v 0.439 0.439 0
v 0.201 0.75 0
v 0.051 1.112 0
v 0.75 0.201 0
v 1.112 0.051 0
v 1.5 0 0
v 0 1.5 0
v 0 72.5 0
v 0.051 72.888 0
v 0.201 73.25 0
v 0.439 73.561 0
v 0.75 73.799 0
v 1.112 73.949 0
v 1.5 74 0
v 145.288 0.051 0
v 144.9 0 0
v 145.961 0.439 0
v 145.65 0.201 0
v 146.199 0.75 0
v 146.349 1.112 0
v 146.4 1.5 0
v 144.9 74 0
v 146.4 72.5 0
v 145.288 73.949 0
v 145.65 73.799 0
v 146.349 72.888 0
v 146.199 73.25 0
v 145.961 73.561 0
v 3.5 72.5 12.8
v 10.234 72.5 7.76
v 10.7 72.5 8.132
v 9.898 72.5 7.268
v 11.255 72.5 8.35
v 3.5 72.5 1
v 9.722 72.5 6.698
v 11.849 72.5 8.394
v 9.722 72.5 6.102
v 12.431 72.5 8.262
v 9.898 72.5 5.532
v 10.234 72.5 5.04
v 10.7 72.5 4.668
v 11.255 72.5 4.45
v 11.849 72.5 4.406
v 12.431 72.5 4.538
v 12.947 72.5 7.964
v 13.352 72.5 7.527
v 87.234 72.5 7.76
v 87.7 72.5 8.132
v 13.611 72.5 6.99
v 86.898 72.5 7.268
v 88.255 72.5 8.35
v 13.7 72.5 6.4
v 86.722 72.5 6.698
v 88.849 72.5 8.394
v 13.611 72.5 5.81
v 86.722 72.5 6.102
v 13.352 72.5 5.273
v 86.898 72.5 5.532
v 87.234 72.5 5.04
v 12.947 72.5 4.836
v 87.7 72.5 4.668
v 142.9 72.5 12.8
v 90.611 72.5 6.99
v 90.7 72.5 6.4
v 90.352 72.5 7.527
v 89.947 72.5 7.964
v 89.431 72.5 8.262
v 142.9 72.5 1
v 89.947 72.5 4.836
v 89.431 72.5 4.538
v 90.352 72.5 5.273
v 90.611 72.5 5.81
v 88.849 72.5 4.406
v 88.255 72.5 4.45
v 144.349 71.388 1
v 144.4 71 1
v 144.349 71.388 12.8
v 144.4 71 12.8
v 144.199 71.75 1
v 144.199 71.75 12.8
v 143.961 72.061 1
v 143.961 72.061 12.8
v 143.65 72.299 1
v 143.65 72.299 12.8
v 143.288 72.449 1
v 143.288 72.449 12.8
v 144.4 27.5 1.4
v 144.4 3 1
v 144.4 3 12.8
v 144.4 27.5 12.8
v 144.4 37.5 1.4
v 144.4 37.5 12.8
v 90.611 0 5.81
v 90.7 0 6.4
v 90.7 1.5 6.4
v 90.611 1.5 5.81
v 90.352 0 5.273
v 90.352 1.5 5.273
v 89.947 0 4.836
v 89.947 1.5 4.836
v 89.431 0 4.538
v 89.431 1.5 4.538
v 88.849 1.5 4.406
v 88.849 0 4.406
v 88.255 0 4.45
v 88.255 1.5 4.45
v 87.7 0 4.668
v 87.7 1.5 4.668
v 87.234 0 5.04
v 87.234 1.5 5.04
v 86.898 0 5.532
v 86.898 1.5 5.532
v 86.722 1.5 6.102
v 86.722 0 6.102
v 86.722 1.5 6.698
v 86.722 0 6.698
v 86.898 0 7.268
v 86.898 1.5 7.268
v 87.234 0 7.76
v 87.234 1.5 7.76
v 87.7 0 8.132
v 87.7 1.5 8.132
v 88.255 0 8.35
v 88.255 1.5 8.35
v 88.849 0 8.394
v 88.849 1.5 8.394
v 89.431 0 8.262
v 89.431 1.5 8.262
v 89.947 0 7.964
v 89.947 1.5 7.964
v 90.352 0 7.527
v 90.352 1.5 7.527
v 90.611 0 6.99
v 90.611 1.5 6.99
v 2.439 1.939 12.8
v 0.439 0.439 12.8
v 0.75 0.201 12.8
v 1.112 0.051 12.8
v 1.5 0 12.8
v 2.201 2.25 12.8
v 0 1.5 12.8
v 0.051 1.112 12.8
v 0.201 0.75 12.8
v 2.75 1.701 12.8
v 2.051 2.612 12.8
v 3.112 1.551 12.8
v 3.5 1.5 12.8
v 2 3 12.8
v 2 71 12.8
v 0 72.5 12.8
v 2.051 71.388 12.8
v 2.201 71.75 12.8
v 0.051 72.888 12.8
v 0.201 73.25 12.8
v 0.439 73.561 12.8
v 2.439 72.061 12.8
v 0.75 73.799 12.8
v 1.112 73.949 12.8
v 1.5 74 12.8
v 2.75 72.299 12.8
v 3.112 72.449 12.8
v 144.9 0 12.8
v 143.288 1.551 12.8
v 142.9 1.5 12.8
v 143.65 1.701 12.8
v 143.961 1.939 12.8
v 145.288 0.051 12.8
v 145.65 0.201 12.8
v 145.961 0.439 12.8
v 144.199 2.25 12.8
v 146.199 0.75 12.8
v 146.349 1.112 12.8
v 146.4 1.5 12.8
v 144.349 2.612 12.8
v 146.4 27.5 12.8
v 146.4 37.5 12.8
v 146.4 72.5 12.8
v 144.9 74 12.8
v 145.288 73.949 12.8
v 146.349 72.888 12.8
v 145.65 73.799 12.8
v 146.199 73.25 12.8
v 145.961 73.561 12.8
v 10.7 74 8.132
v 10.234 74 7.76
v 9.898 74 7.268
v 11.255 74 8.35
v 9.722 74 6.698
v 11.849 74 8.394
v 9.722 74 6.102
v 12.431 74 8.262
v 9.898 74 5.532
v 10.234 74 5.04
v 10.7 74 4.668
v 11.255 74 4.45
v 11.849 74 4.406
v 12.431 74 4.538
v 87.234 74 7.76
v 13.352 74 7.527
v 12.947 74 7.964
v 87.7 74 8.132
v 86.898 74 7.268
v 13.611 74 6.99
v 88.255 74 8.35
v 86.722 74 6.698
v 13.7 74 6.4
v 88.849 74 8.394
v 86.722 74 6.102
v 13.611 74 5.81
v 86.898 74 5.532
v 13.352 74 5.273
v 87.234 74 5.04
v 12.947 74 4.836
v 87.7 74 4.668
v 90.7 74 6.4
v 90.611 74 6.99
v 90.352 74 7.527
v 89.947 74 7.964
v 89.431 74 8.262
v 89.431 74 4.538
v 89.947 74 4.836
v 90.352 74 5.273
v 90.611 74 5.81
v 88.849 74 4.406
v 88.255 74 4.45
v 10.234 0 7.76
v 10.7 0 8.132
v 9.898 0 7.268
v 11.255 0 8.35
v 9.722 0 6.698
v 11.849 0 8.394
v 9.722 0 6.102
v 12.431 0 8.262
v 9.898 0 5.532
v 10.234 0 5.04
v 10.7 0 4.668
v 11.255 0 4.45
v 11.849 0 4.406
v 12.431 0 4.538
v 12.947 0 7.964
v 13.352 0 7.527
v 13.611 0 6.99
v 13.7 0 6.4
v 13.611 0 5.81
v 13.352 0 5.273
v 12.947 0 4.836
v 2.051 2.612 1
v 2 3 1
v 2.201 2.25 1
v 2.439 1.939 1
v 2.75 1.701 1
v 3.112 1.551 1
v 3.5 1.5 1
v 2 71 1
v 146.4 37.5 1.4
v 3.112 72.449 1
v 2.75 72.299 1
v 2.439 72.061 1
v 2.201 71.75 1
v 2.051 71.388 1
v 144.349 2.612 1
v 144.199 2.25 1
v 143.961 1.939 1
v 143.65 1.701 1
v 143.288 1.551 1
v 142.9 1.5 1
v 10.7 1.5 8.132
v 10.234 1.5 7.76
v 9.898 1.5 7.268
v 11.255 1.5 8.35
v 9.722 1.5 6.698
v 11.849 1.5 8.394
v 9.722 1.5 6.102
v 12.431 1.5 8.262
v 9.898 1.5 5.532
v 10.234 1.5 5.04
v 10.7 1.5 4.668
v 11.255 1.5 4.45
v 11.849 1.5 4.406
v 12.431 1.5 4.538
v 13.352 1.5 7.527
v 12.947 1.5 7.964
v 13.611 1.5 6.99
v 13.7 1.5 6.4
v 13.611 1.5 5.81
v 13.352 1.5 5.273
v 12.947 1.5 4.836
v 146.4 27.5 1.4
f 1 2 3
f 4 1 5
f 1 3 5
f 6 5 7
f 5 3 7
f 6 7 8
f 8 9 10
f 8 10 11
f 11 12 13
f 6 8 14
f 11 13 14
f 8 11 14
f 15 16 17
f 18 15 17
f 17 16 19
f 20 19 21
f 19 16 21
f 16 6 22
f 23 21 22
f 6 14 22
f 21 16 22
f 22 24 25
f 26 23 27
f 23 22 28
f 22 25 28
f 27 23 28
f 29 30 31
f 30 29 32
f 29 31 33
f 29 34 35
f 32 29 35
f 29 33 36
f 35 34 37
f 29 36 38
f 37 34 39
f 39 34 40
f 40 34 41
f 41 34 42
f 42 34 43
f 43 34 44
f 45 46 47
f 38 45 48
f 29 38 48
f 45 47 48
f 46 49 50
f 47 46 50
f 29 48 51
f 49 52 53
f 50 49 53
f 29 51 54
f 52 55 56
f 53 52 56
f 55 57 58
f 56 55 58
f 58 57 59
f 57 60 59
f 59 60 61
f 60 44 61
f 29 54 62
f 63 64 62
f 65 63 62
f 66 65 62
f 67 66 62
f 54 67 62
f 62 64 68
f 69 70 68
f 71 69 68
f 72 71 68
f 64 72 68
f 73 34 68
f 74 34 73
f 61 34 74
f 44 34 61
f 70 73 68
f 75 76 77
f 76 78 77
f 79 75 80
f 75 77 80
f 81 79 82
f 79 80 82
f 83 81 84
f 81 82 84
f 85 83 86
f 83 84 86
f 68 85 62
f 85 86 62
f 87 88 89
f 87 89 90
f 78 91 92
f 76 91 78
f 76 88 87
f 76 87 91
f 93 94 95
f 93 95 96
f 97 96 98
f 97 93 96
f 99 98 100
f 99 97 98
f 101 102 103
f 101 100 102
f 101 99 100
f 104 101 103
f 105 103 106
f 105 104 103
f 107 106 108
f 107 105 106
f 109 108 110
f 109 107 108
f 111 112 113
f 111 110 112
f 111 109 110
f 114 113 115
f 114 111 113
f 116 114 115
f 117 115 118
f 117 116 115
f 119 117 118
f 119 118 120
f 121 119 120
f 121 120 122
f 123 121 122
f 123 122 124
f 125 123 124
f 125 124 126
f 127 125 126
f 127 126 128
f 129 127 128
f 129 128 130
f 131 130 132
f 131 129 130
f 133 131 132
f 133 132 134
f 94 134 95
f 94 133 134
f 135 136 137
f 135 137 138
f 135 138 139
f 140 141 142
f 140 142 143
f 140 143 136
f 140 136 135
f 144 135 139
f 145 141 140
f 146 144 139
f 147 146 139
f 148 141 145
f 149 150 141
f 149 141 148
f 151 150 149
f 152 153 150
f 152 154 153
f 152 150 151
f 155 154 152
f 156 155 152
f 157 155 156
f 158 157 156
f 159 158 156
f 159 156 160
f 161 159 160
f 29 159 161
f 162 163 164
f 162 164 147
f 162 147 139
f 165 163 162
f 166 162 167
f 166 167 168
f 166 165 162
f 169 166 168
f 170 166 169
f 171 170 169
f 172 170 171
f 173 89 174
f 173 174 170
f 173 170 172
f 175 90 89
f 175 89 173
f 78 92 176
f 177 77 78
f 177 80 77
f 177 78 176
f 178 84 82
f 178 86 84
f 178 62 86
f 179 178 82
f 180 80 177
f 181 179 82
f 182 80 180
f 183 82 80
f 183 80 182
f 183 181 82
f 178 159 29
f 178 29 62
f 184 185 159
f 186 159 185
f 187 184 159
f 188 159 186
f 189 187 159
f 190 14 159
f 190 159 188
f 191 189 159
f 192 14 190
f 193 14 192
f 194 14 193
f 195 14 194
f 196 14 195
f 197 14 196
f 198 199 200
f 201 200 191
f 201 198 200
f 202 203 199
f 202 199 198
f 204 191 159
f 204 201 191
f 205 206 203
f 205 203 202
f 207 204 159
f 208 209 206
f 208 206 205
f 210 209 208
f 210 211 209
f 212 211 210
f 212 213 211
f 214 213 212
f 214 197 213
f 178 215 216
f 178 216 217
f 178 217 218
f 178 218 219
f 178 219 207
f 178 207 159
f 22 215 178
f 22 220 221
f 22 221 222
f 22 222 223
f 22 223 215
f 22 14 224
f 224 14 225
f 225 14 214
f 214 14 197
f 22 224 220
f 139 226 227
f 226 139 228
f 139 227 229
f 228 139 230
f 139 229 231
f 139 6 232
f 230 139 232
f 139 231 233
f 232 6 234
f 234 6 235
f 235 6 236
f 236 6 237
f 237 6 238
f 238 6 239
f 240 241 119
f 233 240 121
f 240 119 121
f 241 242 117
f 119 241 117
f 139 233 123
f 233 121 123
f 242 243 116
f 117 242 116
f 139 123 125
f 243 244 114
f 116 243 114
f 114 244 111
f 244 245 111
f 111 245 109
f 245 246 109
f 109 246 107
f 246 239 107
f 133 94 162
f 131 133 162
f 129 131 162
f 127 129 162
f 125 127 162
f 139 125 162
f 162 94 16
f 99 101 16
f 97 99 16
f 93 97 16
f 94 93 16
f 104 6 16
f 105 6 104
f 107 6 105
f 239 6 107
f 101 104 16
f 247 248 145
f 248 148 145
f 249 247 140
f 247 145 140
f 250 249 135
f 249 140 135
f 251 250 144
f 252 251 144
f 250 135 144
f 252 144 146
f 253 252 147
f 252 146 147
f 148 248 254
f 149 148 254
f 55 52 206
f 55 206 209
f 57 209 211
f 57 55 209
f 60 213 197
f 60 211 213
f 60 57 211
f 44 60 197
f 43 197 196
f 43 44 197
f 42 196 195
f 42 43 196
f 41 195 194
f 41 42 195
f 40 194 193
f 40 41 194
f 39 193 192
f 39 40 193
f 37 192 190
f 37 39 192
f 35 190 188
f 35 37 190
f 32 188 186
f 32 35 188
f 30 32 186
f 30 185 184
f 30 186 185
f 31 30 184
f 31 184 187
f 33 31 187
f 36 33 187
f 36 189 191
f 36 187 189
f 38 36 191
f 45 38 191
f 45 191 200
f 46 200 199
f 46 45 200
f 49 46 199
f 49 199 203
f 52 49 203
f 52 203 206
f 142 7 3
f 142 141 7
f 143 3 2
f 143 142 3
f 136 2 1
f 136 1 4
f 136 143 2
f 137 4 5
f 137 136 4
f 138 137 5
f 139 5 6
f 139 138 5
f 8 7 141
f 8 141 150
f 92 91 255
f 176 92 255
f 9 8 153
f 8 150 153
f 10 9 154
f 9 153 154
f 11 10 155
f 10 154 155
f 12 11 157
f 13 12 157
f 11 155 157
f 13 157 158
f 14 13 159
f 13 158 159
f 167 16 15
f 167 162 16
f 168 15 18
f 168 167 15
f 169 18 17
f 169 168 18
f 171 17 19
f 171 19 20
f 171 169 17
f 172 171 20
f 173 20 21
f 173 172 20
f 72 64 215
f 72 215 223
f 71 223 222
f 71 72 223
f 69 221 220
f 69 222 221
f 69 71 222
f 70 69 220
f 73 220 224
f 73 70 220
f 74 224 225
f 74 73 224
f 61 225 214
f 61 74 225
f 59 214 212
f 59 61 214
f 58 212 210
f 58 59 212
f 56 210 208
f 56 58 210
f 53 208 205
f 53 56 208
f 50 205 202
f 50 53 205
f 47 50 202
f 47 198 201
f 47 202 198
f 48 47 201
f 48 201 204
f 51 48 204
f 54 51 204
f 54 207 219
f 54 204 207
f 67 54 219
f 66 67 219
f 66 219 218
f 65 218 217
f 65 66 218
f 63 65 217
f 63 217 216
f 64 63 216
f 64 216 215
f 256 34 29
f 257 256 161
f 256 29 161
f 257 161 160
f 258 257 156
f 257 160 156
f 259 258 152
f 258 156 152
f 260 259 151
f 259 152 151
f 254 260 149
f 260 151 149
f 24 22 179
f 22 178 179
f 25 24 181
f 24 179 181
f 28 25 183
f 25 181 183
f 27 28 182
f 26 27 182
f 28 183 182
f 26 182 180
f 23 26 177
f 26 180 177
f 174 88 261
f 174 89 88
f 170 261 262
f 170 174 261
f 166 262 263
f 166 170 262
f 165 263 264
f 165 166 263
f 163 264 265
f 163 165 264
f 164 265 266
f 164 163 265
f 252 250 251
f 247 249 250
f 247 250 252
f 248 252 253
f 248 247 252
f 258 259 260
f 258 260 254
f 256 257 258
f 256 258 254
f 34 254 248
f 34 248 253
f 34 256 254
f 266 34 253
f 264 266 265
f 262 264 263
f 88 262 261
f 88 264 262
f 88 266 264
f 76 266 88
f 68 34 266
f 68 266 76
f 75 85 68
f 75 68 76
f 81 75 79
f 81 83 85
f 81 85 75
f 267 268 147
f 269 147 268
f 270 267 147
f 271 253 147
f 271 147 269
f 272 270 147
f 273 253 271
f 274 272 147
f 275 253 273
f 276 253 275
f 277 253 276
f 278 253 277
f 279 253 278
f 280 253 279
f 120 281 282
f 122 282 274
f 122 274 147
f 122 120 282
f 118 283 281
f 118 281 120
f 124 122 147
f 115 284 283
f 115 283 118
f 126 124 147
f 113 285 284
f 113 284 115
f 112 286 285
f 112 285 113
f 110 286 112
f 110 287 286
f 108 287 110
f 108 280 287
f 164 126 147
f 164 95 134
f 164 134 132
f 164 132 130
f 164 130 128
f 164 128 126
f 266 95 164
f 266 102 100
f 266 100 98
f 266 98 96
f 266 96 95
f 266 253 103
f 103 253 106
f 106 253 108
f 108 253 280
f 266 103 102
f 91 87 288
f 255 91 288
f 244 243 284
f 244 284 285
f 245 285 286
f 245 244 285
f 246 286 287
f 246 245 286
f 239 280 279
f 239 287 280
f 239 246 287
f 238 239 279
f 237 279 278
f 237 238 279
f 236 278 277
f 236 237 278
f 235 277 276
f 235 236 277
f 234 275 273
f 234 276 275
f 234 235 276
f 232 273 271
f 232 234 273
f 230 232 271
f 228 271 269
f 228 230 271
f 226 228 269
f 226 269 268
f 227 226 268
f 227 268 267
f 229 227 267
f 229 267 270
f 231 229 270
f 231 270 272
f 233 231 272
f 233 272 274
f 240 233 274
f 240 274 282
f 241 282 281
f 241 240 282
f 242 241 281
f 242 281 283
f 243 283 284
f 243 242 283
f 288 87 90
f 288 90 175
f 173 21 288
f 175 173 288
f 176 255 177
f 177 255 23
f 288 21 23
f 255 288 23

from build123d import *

# Parameters (mm, degrees)
CYLINDER_R       = 2
CYLINDER_DEPTH   = 100
ARRAY002_X_COUNT = 2
ARRAY002_X_PITCH = 77
BOX009_W         = 30
BOX009_H         = 10
BOX009_DEPTH     = 14.5
BOX001_W         = 142.4
BOX001_H         = 71
BOX001_DEPTH     = 13.3
BOX_W            = 146.4
BOX_H            = 74
BOX_DEPTH        = 12.8
FILLET_R         = 1.5


with BuildPart() as hdd_side_holes_clone:
    # Cylinder → Cylinder (new body)
    with BuildSketch(Plane(origin=(9.5, -16, 3.5), x_dir=(1, 0, 0), z_dir=(0, 1, 0))):
        Circle(CYLINDER_R)
    extrude(amount=CYLINDER_DEPTH)

    # Array002 X: hdd side holes clone ×2


with BuildPart() as hdd_side_holes_clone_1:
    add(hdd_side_holes_clone.part)
    with Locations(*[(i * ARRAY002_X_PITCH, 0, 0) for i in range(1, ARRAY002_X_COUNT)]):
        add(hdd_side_holes_clone.part)


with BuildPart() as hdd_side_holes_clone_2:
    # Body placement: moved
    add(hdd_side_holes_clone_1.part.moved(Location((2.2, 0, 2.9))))


with BuildPart() as usb_extent_hole:
    # Box009 → Box009 (new body)
    with BuildSketch(Plane(origin=(131, 27.5, 1.4), x_dir=(1, 0, 0), z_dir=(0, 0, 1))):
        with Locations((15, 5)):
            Rectangle(BOX009_W, BOX009_H)
    extrude(amount=BOX009_DEPTH)


with BuildPart() as bottom_body_hole_fusion:
    # Box001 → Box001 (new body)
    with BuildSketch(Plane(origin=(2, 1.5, 1), x_dir=(1, 0, 0), z_dir=(0, 0, 1))):
        with Locations((71.2, 35.5)):
            Rectangle(BOX001_W, BOX001_H)
    extrude(amount=BOX001_DEPTH)

    # Fusion: union hdd side holes clone, usb extent hole
    add(hdd_side_holes_clone_2.part)
    add(usb_extent_hole.part)


with BuildPart() as bottom_fillet:
    # Box → Box (new body)
    with BuildSketch(Plane.XY):
        with Locations((73.2, 37)):
            Rectangle(BOX_W, BOX_H)
    extrude(amount=BOX_DEPTH)

    # Cut: cut bottom body hole fusion
    add(bottom_body_hole_fusion.part, mode=Mode.SUBTRACT)

    # Fillet
    fillet_edges = [bottom_fillet.edges().sort_by_distance(p)[0] for p in [
        (0, 0, 6.4),
        (0, 74, 6.4),
        (146.4, 0, 6.4),
        (146.4, 74, 6.4),
        (144.4, 72.5, 6.9),
        (144.4, 1.5, 6.9),
        (2, 72.5, 6.9),
        (2, 1.5, 6.9),
    ]]
    fillet(fillet_edges, radius=FILLET_R)


solid = bottom_fillet.part
